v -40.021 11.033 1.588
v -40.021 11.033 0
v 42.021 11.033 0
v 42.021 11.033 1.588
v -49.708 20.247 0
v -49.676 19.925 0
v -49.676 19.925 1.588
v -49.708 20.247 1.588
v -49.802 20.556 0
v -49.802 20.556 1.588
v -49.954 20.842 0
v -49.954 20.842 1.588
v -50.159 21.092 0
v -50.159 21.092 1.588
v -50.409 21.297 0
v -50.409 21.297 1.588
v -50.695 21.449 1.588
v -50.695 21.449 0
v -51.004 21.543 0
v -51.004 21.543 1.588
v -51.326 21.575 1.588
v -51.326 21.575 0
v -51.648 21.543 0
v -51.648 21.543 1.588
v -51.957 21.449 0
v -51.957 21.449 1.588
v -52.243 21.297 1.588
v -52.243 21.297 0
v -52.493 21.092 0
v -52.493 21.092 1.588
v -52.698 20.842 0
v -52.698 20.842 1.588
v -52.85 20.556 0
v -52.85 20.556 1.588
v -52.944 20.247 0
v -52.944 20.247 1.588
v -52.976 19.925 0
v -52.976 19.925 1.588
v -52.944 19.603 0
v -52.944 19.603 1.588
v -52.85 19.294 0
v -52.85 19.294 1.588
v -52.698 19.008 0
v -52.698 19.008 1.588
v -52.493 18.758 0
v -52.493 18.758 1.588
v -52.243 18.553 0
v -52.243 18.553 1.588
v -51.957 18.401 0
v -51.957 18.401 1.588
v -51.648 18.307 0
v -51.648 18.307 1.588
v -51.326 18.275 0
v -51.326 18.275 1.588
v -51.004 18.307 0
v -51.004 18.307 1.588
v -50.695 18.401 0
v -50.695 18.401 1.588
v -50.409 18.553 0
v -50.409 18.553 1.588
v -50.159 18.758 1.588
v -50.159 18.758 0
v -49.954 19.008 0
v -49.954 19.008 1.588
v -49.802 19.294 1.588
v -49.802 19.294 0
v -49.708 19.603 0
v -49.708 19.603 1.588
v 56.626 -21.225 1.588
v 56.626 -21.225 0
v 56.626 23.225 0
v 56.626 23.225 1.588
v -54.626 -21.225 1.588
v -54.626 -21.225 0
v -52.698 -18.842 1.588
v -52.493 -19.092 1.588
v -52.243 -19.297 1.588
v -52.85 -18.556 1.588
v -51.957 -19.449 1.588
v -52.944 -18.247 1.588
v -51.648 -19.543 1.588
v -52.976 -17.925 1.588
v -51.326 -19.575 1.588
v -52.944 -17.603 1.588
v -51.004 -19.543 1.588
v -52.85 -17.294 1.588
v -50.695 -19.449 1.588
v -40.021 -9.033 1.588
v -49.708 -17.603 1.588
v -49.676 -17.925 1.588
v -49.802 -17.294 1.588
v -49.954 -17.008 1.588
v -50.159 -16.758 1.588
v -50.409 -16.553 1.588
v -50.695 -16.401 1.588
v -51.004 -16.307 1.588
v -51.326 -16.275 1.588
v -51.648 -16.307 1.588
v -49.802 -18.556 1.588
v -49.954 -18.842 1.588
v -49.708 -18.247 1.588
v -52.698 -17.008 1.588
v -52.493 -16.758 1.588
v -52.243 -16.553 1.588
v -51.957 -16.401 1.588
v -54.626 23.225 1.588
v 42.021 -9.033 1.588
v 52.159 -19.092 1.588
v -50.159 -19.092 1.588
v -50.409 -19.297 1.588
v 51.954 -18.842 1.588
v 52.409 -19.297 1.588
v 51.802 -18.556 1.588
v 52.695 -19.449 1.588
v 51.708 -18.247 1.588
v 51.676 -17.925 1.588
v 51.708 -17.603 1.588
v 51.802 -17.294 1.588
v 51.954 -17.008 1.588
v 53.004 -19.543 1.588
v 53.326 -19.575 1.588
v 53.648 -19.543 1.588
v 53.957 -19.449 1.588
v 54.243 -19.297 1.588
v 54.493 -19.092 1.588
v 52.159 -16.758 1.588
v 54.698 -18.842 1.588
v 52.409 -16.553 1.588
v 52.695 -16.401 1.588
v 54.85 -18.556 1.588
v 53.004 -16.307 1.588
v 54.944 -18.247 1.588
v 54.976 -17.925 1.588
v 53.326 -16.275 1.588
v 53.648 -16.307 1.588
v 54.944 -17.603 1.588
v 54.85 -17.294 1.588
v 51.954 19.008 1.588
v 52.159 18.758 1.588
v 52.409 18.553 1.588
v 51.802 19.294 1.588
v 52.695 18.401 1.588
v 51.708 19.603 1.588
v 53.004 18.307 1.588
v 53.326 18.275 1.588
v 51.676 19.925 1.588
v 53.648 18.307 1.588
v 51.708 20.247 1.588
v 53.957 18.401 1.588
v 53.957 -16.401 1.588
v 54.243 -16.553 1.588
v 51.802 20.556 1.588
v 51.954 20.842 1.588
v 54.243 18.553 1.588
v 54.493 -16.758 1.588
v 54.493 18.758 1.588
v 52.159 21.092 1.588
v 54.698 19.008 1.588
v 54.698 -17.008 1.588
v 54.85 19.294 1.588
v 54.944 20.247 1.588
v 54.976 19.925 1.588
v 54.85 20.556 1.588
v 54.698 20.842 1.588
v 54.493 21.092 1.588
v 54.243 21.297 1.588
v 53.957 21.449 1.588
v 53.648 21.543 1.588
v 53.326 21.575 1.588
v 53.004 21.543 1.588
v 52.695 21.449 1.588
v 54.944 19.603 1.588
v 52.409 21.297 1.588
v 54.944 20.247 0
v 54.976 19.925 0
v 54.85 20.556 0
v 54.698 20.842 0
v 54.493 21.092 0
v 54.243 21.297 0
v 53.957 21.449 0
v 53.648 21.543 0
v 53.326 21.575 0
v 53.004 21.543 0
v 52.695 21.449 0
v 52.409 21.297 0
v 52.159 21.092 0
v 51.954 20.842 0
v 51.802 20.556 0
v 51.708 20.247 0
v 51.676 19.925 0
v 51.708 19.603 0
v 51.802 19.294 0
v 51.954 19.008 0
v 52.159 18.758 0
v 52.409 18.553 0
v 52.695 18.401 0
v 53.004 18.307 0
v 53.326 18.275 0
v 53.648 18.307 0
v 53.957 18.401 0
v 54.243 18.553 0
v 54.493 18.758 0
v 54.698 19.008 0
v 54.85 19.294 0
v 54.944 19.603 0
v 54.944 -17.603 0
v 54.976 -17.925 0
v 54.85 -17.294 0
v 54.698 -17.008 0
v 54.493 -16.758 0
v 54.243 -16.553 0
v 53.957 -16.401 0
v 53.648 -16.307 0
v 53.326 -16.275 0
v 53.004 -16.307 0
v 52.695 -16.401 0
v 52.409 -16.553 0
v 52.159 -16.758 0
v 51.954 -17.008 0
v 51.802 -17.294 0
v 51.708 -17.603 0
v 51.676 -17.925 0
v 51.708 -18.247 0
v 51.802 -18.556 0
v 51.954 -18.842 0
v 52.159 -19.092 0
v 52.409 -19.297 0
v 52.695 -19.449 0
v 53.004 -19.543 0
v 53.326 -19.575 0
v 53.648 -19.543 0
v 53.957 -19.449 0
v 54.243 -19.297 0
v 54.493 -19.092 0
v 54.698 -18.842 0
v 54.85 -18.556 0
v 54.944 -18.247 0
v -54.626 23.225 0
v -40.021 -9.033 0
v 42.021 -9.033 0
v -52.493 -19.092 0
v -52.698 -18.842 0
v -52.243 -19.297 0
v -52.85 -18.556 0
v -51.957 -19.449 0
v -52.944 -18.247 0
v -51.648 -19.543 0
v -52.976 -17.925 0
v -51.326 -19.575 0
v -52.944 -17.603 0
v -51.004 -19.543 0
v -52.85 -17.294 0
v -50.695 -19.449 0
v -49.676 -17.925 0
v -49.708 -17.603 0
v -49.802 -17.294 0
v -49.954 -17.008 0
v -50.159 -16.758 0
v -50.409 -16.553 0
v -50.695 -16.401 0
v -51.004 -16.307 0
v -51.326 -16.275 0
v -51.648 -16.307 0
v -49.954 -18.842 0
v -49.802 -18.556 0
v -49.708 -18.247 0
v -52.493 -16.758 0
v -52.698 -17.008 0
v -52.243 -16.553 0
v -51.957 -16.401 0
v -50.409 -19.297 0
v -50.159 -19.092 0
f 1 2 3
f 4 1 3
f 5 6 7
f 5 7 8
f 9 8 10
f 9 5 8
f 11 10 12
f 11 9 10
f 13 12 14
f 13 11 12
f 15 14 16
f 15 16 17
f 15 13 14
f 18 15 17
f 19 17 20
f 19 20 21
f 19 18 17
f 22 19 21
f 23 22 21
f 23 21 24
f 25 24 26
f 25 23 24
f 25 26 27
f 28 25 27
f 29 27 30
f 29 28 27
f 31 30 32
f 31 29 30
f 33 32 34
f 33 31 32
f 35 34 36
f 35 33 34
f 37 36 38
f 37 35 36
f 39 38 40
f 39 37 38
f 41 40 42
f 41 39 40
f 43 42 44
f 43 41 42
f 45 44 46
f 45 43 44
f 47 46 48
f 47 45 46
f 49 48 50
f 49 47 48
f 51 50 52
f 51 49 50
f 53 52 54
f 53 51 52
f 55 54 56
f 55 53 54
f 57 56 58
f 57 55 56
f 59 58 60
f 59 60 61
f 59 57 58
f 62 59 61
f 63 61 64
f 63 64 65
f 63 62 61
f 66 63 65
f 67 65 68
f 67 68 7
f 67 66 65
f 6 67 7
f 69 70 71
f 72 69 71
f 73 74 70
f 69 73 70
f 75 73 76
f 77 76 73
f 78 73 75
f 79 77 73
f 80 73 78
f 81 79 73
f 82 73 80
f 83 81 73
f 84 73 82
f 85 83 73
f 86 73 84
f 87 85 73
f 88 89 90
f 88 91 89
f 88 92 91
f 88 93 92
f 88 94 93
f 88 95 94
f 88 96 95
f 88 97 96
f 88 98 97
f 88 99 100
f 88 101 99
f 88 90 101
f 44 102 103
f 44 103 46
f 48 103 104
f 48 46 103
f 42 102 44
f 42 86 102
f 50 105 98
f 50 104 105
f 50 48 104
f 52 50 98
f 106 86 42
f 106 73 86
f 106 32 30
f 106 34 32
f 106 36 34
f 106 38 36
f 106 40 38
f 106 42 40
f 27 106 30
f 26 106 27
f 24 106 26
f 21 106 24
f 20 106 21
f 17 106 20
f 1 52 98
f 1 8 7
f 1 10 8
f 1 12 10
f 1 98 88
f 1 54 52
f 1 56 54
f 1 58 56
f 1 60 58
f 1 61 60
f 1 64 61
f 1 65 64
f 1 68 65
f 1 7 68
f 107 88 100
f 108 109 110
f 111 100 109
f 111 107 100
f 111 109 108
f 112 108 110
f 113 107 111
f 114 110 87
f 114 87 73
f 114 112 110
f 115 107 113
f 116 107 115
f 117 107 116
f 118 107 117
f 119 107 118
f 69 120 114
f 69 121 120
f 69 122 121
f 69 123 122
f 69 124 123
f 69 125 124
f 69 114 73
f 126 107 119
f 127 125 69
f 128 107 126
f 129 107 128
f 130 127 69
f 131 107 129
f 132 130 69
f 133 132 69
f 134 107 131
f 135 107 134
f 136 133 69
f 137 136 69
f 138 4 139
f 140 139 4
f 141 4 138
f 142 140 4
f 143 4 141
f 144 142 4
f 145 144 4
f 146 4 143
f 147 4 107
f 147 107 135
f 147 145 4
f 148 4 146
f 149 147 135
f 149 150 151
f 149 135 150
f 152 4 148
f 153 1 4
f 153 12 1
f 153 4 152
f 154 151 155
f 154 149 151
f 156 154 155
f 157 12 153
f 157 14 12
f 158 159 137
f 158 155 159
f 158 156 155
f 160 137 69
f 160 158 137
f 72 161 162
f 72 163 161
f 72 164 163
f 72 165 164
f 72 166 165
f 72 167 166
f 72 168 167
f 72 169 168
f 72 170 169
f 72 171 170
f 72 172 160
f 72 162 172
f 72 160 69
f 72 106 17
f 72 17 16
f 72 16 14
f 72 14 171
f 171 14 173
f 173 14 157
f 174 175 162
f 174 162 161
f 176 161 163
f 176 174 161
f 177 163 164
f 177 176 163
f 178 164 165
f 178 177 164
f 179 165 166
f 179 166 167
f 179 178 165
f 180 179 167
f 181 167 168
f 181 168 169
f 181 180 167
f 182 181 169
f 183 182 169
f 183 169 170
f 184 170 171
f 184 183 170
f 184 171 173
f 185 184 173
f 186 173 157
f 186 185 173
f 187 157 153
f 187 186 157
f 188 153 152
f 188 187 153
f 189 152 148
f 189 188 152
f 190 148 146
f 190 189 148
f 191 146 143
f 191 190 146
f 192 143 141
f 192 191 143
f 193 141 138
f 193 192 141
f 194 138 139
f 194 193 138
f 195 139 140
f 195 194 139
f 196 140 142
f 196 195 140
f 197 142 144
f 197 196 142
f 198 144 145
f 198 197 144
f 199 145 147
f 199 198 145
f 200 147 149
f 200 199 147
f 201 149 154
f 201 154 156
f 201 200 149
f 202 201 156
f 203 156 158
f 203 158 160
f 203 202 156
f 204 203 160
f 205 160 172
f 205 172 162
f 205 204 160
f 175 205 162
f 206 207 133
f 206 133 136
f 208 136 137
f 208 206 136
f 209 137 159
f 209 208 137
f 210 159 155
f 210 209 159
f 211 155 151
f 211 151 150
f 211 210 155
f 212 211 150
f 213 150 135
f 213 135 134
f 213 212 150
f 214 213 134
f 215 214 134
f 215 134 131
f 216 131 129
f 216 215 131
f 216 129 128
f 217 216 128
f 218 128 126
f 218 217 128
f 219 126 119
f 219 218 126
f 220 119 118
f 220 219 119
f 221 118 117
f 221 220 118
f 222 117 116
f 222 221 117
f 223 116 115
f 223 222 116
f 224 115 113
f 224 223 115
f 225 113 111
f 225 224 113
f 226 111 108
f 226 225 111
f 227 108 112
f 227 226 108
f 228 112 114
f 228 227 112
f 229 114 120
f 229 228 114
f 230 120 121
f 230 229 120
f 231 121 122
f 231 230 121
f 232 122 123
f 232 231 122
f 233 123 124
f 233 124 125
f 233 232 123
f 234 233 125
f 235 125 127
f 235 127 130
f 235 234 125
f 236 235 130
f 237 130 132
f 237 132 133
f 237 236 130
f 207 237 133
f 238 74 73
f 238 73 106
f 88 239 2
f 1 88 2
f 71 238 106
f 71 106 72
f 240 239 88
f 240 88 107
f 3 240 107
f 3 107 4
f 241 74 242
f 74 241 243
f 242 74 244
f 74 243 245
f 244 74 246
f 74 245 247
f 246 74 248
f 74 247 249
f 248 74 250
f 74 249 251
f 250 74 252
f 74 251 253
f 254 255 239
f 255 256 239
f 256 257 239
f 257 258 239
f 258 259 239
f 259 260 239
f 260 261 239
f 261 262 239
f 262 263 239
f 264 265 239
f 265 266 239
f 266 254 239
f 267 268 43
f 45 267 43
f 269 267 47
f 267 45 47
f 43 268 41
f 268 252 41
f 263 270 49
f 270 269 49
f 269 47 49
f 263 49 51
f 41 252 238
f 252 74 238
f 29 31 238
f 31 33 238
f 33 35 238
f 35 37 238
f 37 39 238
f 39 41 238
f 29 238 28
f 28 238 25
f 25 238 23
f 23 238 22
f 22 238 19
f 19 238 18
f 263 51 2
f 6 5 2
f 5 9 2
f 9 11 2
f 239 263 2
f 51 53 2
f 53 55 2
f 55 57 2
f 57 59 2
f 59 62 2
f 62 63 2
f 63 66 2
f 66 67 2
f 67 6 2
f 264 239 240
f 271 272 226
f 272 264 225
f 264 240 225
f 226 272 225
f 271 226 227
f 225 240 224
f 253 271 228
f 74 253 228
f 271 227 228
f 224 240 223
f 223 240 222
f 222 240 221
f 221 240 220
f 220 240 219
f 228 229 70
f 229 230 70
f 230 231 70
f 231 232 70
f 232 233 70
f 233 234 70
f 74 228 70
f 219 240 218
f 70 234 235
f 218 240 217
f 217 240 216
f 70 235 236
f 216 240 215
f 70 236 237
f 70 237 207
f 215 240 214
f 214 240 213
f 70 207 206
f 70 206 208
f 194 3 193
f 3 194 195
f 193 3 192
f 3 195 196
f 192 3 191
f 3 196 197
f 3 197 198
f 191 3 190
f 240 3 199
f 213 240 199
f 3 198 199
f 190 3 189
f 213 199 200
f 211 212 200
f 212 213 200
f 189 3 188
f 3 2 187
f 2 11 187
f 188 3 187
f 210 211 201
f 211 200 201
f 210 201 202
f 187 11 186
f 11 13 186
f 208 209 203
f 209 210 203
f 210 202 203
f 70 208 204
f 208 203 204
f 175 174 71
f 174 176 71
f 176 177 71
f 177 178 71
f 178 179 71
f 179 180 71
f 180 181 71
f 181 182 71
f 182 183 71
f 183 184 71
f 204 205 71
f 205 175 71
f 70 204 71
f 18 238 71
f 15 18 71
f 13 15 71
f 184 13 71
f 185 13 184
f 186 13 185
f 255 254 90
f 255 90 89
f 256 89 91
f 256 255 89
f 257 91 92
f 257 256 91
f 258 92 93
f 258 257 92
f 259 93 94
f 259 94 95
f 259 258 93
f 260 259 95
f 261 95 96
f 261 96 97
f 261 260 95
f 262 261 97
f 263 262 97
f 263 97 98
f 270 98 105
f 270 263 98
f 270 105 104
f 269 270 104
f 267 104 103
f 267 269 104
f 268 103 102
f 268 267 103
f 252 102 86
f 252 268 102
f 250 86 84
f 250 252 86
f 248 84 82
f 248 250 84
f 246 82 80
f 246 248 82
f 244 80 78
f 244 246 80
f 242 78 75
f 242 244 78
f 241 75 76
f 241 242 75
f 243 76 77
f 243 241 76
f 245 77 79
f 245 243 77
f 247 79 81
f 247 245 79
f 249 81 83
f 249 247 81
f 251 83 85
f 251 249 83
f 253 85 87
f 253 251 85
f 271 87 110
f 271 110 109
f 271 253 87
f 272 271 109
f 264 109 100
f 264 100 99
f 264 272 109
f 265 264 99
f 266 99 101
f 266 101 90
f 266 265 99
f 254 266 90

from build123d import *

# Parameters (mm, degrees)
SKETCH_W     = 111.252
SKETCH_H     = 44.45
SKETCH_R     = 1.65
PAD_DEPTH    = 1.5875
SKETCH001_R  = 1.65
SKETCH001_W  = 82.042
SKETCH001_H  = 20.066
POCKET_DEPTH = 1.5885


with BuildPart() as part:
    # Sketch → Pad (new body)
    with BuildSketch(Plane.XY):
        with Locations((1, 1)):
            Rectangle(SKETCH_W, SKETCH_H)
        with Locations((-51.326, 19.925)):
            Circle(SKETCH_R, mode=Mode.SUBTRACT)
        with Locations((53.326, -17.925)):
            Circle(SKETCH_R, mode=Mode.SUBTRACT)
        with Locations((53.326, 19.925)):
            Circle(SKETCH_R, mode=Mode.SUBTRACT)
        with Locations((-51.326, -17.925)):
            Circle(SKETCH_R, mode=Mode.SUBTRACT)
    extrude(amount=PAD_DEPTH)

    # Sketch001 → Pocket (cut, through all)
    with BuildSketch(Plane.XY):
        with Locations((-51.326, 19.925)):
            Circle(SKETCH001_R)
        with Locations((1, 1)):
            Rectangle(SKETCH001_W, SKETCH001_H)
    extrude(amount=POCKET_DEPTH, mode=Mode.SUBTRACT)


solid = part.part
